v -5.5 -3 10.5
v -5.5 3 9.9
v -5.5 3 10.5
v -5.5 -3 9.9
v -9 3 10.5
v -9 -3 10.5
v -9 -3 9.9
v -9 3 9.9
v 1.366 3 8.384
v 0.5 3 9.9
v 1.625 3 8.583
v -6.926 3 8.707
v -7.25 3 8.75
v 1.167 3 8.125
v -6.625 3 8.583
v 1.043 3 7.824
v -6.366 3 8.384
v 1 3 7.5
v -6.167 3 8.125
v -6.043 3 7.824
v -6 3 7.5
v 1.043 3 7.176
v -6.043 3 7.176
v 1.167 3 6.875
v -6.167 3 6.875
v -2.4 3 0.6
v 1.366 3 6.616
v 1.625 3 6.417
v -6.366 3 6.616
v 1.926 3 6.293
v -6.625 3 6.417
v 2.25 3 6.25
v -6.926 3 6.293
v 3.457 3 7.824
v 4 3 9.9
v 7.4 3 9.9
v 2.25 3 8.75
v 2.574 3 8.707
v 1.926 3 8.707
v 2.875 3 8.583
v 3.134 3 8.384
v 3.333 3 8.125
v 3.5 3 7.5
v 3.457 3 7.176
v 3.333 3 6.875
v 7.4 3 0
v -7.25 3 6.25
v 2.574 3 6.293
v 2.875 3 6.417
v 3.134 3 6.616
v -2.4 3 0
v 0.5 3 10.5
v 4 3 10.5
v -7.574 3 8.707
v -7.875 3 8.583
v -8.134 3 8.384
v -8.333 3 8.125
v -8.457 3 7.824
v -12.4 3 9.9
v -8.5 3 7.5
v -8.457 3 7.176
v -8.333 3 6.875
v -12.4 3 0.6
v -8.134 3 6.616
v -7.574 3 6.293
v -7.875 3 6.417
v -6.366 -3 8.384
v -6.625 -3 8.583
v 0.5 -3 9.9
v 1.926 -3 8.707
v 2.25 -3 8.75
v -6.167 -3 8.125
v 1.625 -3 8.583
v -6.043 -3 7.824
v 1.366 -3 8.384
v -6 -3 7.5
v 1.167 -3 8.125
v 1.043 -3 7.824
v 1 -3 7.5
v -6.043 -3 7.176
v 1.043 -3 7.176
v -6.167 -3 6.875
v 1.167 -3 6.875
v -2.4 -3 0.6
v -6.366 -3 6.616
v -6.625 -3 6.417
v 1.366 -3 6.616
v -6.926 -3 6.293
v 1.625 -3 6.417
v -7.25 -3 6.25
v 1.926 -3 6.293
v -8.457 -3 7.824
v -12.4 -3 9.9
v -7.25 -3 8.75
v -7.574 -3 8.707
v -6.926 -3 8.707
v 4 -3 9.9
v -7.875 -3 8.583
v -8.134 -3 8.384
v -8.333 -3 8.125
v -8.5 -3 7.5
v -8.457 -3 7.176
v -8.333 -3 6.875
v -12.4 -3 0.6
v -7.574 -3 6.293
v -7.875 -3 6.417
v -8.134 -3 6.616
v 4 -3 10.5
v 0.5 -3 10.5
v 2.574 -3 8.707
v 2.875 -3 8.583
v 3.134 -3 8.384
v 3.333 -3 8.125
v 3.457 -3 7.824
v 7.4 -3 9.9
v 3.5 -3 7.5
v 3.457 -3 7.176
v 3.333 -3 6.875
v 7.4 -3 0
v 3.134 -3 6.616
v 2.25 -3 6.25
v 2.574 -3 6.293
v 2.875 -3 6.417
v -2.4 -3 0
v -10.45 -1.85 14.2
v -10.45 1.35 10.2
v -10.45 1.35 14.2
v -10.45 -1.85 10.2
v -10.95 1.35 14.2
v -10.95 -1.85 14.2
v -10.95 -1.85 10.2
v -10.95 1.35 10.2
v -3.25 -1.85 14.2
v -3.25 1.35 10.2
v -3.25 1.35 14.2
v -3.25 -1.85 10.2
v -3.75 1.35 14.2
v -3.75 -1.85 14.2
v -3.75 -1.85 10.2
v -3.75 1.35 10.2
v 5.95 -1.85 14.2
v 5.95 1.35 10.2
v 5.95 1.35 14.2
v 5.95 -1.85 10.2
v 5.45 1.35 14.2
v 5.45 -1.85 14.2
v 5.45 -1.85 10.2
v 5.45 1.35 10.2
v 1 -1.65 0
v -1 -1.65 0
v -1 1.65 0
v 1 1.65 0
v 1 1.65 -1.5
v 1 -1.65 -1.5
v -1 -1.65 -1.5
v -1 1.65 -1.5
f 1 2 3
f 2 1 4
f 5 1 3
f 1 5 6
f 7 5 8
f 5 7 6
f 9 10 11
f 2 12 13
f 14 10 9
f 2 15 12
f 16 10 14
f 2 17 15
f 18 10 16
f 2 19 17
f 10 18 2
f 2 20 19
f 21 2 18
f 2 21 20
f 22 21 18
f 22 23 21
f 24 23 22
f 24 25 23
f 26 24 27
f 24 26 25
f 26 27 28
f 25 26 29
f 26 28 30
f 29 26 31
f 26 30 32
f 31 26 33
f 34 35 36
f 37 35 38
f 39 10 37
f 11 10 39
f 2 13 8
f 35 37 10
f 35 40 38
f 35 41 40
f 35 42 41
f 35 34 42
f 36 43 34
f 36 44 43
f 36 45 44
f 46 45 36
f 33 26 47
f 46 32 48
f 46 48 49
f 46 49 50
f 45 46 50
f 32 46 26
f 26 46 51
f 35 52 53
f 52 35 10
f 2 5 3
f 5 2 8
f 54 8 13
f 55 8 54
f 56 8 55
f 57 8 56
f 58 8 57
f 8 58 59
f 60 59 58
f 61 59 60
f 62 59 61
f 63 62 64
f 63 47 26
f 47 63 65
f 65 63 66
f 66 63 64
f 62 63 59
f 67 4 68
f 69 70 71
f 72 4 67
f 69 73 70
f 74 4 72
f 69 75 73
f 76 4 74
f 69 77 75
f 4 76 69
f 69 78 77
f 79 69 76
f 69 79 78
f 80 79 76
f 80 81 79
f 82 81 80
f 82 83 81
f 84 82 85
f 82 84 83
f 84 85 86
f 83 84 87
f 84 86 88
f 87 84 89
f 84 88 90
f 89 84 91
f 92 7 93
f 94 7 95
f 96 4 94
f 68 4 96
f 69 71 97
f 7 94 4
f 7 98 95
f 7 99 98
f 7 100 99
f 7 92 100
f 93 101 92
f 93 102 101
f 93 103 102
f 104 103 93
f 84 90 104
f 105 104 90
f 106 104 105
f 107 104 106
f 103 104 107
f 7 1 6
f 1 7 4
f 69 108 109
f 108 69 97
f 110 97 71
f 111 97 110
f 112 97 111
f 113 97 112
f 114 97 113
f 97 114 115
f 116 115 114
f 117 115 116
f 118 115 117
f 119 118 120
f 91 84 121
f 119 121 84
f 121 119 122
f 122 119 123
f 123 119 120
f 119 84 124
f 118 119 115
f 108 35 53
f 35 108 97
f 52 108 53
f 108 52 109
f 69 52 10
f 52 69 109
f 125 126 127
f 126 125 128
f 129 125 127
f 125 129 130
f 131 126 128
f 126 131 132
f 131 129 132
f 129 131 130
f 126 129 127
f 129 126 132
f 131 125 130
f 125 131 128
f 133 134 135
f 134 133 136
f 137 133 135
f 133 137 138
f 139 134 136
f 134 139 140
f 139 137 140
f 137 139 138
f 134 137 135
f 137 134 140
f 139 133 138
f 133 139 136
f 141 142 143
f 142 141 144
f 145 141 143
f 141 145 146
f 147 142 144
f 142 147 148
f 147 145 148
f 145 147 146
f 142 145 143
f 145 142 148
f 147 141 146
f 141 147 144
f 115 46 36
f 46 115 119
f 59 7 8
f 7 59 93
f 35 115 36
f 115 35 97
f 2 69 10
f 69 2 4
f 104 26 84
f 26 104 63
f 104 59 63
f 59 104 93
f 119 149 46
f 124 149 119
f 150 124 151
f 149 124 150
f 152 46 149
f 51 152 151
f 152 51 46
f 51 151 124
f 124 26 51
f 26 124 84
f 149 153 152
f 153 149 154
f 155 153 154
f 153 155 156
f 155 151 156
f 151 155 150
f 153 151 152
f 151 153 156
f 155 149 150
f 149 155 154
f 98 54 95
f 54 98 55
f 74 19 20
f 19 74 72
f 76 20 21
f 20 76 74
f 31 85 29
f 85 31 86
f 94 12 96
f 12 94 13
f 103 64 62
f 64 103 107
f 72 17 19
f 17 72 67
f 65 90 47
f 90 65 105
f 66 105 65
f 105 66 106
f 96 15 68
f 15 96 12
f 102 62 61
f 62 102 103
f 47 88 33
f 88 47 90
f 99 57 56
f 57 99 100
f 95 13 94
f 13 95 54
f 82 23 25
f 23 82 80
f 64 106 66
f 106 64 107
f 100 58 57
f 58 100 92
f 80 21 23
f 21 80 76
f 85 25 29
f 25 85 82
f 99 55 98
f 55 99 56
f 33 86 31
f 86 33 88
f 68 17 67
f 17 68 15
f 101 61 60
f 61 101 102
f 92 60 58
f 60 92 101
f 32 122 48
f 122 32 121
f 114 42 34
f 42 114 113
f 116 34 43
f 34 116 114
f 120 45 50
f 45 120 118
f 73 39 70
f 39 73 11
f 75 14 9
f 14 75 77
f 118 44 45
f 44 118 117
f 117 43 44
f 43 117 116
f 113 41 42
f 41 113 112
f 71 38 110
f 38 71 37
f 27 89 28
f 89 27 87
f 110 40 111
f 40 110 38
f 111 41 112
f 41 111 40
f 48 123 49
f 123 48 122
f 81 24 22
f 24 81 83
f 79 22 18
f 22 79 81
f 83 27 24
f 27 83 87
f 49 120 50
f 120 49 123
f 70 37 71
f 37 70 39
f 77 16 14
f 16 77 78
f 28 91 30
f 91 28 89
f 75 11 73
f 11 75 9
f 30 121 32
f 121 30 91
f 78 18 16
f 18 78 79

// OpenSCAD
// Don't print this file, purchase real micro switches
// e.g. Honeywell ZM10B10A01 or OMRON SS-5 or similar.

dHole = 9.5;  // scres holes on center
switchOff = 2.5;     // center of block to center of switch
hTot = 10.5;  // including bumps
hMain = 9.3;  // main body of switch
wBase = 19.8;  // perhaps design 20, measured this

microswitch();

//translate([-2.5,0,7.5]) rotate([180,0,0])
//%microswitch1();

//translate([0,-20,-1]) {
//   rotate([-90,0,0]) %microswitch();
//   //projection(cut=true)
//     microswitchGuide();
//}

module pairX(d) for (a=[-d,d]) translate([a,0]) children();

module microswitchHoles(fuzz=0,diam=2.5,sep=dHole,len=7)
    pairX(sep/2) rotate([90, 0, 0])
        cylinder(d=diam+fuzz, h=len, center=true, $fn=24);

module microswitch() difference() {
    union() {
        translate([2.5,0,1]) cube([9.8,6,2],center=true);
        translate([-switchOff,0,0]) {
            translate([0,0,hTot-1]) pairX(dHole/2) cube([3.5,6,2],center=true);
            translate([0,0,hTot/2]) cube([wBase,6,hMain],center=true);
            for (x = [-8.2, -1, 8.2]) translate([x, -.25, hTot+2-.3])
                cube([0.5, 3.2, 4], center=true);
        }
        #translate([0, 0, .5]) cube([2, 3.3, 4], center=true); // button
    }
    
    translate([-switchOff,0,7.5]) microswitchHoles();
}

/// old model, less detail, not centered on switch tab
module microswitch1() {
  difference() {
    union() {
      translate([0, 0, 2.5])
        cube([19.8, 6, 10], center=true);
      translate([2.5, 0.5, 6])
        cube([2, 3.5, 5], center=true);
      for (x = [-8, -1, 8]) {
        translate([x, 0, 0])
          cube([0.6, 3.2, 13], center=true);
      }
    }
    microswitchHoles();
  }
}

module microswitchGuide() {
  intersection() {
    difference() {
      hull() {
        translate([-6,0,0]) cylinder(r=4,h=2,$fn=24);
        translate([ 6,0,0]) cylinder(r=4,h=2,$fn=24);
        translate([ 2.4,8,0]) scale([2,1,1]) cylinder(r=3,h=2,$fn=36);
      }
      translate([0,0,-1]) rotate([-90,0,0]) microswitchHoles();
    }
    translate([2.4,8,-1]) microswitchGuideSlot();
  }
}

// little slot to help glide probe handle on top of switch
module microswitchGuideSlot() {
  difference() {
    union() {
      translate([-4.6,0.5,0]) cylinder(h=4,r=4,$fn=36);
      translate([ 4.6,0.5,0]) cylinder(h=4,r=4,$fn=36);
      hull() {
        translate([-15,-13,0]) cube([25,1,4]);
        translate([-11, -1,0]) cube([18,1,4]);
      }
    }
    cylinder(h=15,r=.6,$fn=18,center=true);
  }
}
